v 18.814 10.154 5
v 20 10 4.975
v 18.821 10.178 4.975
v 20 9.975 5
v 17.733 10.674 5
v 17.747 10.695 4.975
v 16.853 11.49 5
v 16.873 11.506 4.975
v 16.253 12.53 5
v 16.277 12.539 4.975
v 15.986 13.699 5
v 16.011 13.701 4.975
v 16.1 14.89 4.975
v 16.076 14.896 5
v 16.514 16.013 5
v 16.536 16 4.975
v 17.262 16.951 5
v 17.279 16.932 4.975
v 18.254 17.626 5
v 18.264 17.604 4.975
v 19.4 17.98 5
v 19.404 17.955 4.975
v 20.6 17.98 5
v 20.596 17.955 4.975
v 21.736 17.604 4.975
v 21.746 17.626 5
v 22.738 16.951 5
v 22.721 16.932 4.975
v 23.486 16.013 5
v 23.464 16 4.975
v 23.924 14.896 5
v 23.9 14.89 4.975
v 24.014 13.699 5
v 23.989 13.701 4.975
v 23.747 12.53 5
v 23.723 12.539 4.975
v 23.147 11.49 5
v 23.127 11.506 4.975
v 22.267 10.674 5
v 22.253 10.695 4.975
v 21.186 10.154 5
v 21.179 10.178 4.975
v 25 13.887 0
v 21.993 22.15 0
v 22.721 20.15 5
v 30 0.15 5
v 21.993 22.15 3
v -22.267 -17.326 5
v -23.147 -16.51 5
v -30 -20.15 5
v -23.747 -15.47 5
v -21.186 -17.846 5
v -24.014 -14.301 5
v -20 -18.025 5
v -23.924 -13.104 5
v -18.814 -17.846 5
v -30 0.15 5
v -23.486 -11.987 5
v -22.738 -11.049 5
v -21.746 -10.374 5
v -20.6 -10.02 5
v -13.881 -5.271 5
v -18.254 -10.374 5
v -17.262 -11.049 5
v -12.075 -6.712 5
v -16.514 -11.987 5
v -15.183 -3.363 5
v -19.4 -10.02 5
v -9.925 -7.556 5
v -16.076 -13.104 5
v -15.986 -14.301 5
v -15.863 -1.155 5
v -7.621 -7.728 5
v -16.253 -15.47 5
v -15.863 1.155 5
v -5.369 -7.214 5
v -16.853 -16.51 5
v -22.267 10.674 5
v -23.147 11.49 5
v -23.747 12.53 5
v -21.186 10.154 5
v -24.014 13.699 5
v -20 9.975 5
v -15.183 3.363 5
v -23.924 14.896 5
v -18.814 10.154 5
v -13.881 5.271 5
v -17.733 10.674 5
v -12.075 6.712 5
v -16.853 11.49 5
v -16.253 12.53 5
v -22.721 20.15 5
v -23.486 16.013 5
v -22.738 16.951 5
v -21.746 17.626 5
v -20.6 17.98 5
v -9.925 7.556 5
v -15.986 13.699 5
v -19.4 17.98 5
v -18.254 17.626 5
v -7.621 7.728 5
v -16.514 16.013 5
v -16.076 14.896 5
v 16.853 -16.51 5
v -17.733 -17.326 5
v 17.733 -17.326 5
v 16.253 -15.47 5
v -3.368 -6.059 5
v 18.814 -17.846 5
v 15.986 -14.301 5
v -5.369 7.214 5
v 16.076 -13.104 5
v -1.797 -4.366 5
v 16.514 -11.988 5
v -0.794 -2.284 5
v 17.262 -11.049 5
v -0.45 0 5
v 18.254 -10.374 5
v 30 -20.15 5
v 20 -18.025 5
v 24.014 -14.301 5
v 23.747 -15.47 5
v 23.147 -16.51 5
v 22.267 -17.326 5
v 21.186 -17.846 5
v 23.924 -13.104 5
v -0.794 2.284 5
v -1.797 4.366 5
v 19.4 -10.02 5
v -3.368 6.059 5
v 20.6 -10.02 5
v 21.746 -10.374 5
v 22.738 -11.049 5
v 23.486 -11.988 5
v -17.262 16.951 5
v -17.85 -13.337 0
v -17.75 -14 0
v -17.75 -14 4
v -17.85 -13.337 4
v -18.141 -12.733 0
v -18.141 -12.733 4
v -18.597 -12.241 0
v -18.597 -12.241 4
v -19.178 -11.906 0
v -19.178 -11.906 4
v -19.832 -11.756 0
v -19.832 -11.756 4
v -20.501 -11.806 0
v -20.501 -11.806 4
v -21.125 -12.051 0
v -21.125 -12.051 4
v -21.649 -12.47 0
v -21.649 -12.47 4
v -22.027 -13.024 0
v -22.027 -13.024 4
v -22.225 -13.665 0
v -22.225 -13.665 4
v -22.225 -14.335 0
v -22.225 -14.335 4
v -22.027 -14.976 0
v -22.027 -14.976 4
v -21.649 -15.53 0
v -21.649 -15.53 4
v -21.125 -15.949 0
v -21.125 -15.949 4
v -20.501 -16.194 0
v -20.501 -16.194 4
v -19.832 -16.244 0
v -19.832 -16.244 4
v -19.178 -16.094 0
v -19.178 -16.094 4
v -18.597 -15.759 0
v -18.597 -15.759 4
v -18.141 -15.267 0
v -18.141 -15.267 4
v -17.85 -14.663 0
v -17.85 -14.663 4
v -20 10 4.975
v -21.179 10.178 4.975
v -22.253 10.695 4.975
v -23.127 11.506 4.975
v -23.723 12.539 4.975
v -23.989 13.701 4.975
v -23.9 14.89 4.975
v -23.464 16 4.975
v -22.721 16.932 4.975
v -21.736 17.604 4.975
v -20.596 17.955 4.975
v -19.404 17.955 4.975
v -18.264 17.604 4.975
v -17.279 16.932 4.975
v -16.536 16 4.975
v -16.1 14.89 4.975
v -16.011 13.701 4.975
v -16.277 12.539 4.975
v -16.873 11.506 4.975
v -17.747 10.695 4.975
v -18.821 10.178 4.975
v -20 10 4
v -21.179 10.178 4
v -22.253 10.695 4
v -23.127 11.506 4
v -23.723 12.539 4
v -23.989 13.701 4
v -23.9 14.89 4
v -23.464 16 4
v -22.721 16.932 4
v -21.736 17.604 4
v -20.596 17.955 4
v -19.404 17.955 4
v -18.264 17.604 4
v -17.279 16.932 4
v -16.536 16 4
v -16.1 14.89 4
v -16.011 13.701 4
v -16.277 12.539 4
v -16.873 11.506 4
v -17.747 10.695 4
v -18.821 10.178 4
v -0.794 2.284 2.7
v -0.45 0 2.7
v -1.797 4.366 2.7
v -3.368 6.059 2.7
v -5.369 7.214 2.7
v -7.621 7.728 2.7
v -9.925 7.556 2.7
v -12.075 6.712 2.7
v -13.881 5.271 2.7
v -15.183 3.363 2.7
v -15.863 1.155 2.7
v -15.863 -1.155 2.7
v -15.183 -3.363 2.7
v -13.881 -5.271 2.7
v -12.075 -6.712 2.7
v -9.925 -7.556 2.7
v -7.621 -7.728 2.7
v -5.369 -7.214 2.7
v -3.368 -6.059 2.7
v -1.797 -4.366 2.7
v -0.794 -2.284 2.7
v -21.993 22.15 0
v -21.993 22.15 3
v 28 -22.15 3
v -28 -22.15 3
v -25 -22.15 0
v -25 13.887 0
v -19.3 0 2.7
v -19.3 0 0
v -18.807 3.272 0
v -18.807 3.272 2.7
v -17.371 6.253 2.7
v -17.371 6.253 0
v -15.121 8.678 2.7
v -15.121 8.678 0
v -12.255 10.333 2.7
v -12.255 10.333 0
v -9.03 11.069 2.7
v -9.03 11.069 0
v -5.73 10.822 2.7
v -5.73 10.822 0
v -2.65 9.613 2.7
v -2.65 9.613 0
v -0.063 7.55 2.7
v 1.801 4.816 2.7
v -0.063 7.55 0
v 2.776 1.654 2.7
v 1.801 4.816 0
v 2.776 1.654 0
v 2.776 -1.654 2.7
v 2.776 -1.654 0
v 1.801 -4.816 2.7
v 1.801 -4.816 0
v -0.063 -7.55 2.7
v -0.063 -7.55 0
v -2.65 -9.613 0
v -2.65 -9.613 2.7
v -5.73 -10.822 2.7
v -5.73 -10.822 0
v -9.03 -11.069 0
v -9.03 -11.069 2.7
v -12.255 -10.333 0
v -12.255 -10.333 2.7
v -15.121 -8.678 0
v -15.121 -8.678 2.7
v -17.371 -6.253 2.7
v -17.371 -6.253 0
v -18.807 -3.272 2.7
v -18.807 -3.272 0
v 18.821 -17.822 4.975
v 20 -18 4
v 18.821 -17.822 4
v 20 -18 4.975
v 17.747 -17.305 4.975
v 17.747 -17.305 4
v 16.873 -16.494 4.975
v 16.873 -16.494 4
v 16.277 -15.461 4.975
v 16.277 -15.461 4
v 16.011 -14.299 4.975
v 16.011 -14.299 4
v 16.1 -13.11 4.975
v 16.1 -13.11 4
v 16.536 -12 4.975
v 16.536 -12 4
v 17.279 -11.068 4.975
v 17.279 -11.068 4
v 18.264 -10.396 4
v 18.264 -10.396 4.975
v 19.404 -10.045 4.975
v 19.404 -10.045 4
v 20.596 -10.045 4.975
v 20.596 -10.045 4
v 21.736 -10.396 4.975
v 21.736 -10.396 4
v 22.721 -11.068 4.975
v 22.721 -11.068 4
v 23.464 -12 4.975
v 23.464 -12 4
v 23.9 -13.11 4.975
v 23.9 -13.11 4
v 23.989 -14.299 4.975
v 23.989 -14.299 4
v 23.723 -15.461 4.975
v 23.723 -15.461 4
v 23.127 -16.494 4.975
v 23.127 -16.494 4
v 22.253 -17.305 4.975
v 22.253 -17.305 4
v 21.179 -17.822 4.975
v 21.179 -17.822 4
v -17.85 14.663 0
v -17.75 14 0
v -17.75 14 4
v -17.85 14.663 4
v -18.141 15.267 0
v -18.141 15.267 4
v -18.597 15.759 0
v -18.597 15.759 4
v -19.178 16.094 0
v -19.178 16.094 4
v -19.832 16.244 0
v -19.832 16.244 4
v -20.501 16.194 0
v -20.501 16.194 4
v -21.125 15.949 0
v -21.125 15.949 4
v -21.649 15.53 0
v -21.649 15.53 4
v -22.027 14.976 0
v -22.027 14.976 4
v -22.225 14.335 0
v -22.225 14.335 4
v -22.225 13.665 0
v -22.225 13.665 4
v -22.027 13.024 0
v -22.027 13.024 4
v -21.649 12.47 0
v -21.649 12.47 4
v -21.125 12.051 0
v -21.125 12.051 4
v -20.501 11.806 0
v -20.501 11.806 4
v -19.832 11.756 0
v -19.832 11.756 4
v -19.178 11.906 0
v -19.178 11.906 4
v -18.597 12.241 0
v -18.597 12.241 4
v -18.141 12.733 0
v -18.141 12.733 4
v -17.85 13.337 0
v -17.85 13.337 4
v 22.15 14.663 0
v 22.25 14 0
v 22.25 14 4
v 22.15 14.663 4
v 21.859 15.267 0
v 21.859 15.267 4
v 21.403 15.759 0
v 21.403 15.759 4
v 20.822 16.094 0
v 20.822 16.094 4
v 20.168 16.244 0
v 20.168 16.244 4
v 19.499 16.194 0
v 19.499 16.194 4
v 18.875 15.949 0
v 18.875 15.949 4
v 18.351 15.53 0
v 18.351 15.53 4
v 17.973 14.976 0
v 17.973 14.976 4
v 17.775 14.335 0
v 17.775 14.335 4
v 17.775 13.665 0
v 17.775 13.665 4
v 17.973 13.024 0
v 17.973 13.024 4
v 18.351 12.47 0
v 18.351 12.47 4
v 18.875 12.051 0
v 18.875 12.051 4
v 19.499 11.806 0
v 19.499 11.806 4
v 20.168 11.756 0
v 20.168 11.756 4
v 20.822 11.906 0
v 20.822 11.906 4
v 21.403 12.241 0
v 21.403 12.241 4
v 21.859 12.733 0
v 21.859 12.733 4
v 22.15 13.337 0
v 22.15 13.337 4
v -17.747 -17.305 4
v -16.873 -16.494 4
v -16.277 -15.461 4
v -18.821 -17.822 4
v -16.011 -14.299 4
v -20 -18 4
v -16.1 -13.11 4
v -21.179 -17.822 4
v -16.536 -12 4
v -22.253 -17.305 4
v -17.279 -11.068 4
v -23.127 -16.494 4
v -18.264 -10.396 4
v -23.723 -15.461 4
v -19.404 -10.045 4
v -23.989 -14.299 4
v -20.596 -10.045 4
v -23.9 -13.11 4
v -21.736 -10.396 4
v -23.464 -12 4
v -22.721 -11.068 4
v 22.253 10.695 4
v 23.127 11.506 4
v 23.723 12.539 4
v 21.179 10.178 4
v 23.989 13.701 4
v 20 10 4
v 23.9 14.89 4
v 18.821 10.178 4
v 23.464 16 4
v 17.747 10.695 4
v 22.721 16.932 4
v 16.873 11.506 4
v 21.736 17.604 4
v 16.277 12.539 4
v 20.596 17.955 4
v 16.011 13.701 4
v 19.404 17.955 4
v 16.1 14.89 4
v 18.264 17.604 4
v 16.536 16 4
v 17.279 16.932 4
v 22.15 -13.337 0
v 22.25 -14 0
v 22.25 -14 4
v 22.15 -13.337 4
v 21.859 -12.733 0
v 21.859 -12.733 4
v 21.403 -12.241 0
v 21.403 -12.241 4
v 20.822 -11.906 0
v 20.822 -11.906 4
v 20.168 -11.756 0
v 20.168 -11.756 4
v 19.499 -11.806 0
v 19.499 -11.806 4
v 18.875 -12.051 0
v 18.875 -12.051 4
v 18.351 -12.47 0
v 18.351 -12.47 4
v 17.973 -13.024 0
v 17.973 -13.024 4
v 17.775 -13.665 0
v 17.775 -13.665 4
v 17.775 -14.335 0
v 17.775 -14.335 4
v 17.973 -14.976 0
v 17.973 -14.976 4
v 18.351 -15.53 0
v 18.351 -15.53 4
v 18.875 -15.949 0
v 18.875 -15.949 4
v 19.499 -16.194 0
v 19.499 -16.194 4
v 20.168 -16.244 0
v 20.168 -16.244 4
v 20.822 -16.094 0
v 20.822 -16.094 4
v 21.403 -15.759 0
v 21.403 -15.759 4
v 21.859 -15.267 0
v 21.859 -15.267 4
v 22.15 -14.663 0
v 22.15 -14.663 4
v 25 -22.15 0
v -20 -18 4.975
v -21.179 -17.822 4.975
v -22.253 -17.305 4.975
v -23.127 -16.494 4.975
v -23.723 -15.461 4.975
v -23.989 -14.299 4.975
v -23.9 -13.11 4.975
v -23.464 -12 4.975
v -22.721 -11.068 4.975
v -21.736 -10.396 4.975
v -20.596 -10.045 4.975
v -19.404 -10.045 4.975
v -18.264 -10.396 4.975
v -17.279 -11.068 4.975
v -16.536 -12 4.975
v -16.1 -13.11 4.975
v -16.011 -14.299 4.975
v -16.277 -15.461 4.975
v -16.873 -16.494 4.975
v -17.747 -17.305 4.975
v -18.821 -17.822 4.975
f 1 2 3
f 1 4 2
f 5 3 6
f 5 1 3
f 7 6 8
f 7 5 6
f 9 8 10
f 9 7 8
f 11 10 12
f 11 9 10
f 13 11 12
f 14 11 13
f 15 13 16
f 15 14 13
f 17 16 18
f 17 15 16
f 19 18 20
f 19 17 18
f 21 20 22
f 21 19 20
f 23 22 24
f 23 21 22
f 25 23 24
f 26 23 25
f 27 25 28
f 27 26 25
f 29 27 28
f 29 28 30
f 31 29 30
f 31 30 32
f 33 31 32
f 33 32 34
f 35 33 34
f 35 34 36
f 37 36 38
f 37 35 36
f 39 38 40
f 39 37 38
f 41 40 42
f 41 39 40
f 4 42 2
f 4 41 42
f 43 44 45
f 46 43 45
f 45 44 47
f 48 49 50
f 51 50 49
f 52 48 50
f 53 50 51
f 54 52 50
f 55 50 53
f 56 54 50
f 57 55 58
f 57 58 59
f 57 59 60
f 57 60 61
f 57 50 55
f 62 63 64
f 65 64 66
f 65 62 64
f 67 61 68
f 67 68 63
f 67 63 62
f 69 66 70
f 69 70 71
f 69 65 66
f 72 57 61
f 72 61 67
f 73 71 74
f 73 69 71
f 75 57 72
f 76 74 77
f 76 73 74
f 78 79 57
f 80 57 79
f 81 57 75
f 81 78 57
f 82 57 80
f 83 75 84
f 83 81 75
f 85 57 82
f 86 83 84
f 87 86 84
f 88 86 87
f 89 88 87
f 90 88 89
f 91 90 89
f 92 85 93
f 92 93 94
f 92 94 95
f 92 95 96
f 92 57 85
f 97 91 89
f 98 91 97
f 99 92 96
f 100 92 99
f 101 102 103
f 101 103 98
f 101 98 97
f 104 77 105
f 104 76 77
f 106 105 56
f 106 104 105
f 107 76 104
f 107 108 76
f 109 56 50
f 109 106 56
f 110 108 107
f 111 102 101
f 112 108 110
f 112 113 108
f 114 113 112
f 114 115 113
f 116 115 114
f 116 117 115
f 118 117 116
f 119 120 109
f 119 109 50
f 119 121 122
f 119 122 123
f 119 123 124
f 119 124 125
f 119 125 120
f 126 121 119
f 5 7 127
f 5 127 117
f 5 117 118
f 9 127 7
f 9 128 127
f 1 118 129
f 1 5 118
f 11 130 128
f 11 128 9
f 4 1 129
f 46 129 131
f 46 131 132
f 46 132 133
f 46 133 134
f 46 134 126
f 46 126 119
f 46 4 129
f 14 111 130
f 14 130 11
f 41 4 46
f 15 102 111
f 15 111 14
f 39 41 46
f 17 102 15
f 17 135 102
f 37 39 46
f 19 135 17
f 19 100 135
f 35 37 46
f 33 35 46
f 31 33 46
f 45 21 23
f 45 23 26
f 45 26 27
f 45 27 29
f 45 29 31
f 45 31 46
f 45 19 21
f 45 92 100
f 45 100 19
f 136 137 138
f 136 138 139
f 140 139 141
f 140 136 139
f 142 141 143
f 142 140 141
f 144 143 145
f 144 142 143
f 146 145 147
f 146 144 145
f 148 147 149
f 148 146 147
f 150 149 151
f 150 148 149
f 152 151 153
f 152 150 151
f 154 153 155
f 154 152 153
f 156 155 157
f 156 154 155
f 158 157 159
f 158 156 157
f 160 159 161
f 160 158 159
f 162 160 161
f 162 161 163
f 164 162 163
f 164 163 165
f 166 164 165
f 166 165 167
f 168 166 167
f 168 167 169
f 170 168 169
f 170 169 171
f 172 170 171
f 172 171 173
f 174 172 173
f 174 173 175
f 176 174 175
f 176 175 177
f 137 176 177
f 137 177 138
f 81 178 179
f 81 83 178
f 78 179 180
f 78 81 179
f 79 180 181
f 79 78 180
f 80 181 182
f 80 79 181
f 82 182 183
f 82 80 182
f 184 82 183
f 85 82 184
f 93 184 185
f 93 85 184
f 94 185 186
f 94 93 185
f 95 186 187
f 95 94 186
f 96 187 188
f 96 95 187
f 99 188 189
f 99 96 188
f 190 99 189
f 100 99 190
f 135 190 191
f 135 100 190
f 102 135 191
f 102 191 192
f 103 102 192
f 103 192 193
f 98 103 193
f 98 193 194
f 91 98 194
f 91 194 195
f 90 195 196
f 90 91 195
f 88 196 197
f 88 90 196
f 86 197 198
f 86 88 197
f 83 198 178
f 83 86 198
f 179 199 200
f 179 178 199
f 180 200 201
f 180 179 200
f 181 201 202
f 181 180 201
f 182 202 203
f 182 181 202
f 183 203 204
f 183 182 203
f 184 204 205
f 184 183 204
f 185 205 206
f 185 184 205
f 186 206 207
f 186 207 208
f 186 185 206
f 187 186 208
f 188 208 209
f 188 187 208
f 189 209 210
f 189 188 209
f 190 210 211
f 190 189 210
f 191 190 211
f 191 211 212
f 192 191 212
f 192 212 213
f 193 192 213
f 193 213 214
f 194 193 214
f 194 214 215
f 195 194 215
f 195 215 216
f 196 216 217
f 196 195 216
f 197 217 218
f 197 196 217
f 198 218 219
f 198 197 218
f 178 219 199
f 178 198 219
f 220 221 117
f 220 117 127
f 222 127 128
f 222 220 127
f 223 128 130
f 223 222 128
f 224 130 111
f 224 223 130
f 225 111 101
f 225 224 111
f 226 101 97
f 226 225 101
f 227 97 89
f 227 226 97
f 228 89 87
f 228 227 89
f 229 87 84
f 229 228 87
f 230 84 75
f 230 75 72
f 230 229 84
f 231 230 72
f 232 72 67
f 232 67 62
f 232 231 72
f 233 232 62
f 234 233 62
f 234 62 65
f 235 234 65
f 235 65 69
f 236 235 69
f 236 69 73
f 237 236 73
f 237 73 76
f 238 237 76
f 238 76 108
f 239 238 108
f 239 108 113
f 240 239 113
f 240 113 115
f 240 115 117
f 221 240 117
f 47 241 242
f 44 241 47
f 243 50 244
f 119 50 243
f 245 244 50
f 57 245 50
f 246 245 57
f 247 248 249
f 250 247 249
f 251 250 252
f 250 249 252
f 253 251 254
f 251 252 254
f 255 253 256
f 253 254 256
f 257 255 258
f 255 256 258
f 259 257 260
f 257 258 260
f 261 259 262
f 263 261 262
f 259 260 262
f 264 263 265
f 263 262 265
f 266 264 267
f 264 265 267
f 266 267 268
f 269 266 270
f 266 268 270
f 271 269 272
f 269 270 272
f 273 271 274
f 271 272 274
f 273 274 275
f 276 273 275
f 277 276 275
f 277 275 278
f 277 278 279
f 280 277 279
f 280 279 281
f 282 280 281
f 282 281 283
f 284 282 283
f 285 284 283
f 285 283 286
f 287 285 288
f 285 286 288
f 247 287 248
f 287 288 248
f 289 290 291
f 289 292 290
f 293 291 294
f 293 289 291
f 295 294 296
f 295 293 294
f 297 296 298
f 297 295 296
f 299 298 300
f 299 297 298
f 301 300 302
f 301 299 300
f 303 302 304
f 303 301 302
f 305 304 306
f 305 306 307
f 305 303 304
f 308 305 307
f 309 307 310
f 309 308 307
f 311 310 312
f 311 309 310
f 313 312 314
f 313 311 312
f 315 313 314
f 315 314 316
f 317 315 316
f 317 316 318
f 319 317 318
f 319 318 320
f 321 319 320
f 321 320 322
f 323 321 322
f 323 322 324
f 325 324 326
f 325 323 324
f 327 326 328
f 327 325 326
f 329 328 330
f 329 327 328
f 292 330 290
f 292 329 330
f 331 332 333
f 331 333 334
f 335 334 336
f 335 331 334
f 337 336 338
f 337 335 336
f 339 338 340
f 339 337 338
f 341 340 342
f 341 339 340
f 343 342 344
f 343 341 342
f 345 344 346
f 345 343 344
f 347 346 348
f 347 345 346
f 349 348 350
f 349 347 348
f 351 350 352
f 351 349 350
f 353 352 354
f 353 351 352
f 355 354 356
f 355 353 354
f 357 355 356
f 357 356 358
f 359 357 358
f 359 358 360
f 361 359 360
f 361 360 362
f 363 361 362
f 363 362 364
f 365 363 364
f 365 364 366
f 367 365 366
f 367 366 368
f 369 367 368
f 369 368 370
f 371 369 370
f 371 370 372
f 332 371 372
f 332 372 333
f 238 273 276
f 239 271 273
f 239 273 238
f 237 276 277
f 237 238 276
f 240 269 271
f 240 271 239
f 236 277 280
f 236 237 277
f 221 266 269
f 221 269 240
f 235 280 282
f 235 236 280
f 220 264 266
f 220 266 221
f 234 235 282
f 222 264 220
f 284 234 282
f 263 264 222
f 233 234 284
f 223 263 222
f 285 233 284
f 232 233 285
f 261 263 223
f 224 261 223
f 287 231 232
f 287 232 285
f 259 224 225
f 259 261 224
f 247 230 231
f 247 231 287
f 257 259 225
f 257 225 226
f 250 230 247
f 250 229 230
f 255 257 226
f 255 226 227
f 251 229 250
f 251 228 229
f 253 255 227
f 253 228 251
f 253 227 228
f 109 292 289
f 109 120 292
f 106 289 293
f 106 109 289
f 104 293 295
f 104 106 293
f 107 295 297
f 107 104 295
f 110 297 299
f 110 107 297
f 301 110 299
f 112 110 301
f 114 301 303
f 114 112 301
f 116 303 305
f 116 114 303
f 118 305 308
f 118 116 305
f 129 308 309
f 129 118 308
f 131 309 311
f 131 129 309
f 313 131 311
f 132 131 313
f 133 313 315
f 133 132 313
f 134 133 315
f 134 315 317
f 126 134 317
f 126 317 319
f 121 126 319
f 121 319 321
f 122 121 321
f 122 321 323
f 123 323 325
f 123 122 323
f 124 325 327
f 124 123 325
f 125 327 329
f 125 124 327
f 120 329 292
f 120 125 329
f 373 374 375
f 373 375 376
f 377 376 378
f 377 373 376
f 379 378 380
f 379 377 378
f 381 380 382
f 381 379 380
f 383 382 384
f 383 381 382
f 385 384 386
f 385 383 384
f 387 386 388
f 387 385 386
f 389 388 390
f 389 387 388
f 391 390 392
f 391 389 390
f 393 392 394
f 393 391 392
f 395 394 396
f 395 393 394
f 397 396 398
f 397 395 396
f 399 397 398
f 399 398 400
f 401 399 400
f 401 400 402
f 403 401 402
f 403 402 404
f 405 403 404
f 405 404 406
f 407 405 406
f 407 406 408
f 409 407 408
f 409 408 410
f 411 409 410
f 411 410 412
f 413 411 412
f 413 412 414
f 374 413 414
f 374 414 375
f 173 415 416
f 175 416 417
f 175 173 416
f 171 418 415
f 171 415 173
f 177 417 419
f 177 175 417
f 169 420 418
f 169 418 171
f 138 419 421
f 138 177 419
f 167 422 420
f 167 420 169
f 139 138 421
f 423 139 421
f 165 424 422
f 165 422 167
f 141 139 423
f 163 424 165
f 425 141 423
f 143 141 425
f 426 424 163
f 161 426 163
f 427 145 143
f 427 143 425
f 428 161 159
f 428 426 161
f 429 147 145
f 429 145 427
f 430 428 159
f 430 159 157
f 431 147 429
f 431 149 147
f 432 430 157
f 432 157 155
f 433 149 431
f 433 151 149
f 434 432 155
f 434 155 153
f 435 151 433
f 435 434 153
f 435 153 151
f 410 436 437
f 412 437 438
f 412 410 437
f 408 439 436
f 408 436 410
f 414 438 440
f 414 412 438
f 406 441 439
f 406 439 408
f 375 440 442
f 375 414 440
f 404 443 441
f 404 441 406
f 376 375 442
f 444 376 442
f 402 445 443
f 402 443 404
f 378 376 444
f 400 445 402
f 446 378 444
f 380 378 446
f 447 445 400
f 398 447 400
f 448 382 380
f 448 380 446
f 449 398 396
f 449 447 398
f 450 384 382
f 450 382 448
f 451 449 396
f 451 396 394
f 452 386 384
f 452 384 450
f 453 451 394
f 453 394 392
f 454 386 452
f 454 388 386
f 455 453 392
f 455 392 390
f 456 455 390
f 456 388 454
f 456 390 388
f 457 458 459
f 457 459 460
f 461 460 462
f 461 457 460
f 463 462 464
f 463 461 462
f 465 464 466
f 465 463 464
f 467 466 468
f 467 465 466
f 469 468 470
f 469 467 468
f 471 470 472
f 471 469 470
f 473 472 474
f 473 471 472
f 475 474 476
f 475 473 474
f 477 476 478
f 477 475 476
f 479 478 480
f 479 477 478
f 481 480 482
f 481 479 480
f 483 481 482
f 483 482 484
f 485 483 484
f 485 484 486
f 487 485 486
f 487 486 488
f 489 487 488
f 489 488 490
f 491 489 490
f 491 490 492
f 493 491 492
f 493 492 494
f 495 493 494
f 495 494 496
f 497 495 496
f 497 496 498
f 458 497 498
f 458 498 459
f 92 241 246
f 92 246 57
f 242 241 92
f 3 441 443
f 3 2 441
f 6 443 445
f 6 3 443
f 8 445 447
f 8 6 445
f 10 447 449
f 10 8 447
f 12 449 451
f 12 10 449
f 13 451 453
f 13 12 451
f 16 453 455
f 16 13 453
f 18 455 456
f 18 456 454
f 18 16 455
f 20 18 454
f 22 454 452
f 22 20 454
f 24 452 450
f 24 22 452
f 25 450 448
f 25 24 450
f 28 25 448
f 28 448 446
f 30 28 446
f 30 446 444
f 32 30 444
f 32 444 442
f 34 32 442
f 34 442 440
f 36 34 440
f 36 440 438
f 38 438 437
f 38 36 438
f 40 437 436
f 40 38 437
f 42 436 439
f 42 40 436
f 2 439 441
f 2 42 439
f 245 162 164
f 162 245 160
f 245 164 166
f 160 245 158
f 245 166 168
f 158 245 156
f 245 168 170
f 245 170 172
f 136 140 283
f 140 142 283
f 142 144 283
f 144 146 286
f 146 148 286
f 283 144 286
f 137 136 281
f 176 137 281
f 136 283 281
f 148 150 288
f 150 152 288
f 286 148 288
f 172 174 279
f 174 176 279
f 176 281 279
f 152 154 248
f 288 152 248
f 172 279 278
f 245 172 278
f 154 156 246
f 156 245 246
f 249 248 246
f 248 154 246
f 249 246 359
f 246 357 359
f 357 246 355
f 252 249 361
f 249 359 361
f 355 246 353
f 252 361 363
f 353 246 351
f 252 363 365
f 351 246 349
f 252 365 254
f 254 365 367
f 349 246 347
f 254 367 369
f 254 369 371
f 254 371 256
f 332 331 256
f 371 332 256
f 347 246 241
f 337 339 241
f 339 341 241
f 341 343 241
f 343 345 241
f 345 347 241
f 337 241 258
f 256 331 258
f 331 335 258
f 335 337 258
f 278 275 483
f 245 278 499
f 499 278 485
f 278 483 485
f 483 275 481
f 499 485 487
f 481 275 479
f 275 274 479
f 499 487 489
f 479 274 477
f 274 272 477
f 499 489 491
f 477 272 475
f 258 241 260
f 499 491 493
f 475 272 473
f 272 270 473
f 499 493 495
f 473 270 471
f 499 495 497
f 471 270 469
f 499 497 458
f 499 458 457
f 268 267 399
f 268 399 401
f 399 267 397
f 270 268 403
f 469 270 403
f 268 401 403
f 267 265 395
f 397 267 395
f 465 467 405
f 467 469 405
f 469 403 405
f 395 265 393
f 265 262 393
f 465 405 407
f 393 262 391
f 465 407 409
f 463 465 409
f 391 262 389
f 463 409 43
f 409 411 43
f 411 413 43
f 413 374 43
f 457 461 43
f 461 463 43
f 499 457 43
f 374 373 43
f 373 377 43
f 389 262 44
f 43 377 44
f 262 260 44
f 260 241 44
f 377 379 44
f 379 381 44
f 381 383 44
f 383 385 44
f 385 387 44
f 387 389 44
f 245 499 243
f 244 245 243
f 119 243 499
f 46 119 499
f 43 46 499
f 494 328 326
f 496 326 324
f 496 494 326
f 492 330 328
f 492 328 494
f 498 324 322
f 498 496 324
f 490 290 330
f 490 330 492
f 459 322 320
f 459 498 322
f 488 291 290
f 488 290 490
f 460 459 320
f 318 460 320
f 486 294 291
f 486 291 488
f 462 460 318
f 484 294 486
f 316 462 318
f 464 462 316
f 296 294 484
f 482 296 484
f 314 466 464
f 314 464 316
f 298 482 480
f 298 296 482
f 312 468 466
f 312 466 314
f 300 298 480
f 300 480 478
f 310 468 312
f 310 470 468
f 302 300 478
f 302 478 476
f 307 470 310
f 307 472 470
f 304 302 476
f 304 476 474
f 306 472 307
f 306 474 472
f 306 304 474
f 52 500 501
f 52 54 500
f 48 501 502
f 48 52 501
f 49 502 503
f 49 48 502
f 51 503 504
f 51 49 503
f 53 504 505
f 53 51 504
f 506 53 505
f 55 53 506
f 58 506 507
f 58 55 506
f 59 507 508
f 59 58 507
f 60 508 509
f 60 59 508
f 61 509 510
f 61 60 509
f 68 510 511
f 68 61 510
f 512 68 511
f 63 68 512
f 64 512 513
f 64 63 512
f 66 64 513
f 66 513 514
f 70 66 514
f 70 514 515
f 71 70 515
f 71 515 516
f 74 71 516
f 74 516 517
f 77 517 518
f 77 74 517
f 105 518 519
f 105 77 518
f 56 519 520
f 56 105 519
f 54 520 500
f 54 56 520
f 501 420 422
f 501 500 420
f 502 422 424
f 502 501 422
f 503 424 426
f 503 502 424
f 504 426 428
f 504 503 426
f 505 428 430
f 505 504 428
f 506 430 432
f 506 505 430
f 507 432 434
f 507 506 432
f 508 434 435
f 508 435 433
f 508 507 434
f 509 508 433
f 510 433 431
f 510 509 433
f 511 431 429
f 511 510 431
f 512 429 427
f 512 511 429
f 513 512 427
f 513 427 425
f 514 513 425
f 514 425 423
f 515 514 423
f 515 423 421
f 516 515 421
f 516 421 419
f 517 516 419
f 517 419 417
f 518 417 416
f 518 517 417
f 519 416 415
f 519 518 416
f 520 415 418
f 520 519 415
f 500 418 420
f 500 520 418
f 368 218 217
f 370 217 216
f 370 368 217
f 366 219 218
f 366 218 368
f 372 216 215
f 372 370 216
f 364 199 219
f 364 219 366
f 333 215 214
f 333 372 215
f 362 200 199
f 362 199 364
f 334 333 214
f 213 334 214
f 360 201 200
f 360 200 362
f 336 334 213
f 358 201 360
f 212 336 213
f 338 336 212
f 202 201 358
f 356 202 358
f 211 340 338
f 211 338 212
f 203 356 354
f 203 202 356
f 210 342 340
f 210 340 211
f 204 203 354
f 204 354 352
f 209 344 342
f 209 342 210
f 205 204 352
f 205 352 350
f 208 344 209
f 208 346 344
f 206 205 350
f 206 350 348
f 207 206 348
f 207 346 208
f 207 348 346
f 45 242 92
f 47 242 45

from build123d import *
from OCP.BRepFilletAPI import BRepFilletAPI_MakeChamfer

# Parameters (mm, degrees)
SKETCH2_W                                    = 60
SKETCH2_H                                    = 44.3
SKETCH2_R                                    = 2.25
SKETCH2_R_2                                  = 7.75
BOSS_EXTRUDE1_DEPTH                          = 5
CBORE_FOR_M4_HEX_SOCKET_HEAD_CAP_SCR_2_COUNT = 2
CBORE_FOR_M4_HEX_SOCKET_HEAD_CAP_SCR_2_PITCH = 40
CBORE_FOR_M4_HEX_SOCKET_HEAD_CAP_SCR_3_COUNT = 2
CBORE_FOR_M4_HEX_SOCKET_HEAD_CAP_SCR_3_PITCH = 48.826222463
CBORE_FOR_M4_HEX_SOCKET_HEAD_CAP_SCR_4_COUNT = 2
CBORE_FOR_M4_HEX_SOCKET_HEAD_CAP_SCR_4_PITCH = 28
SKETCH7_R                                    = 11.1
CUT_EXTRUDE1_DEPTH                           = 2.7
CHAMFER2_SIZE                                = 22
CHAMFER2_SIZE2                               = 8.007345154
CHAMFER3_SIZE                                = 2
CHAMFER1_SIZE                                = 5


with BuildPart() as part:
    # Sketch2 → Boss-Extrude1 (new body)
    with BuildSketch(Plane.XY):
        Rectangle(SKETCH2_W, SKETCH2_H)
        with Locations((-20, 14)):
            Circle(SKETCH2_R, mode=Mode.SUBTRACT)
        with Locations((-20, -14)):
            Circle(SKETCH2_R, mode=Mode.SUBTRACT)
        with Locations((20, 14)):
            Circle(SKETCH2_R, mode=Mode.SUBTRACT)
        with Locations((20, -14)):
            Circle(SKETCH2_R, mode=Mode.SUBTRACT)
        with Locations((-8.2, 0)):
            Circle(SKETCH2_R_2, mode=Mode.SUBTRACT)
    extrude(amount=BOSS_EXTRUDE1_DEPTH)

    # Sketch4 → CBORE for M4 Hex Socket Head Cap Screw1 (revolve, cut)
    with BuildSketch(Plane(origin=(-20, 14, 5), x_dir=(0, -1, 0), z_dir=(1, 0, 0))):
        Polygon((0, 0), (0, 5), (2.25, 5), (2.25, 1), (4, 1), (4, 0.025), (4.025, 0), align=None)
    cbore_for_m4_hex_socket_head_cap_screw1 = revolve(axis=Axis((-20, 14, 11.35), (0, 0, -1)), mode=Mode.SUBTRACT)

    # CBORE for M4 Hex Socket Head Cap Scr 2: CBORE for M4 Hex Socket Head Cap Screw1 ×2
    with Locations(*[(i * CBORE_FOR_M4_HEX_SOCKET_HEAD_CAP_SCR_2_PITCH, 0, 0) for i in range(1, CBORE_FOR_M4_HEX_SOCKET_HEAD_CAP_SCR_2_COUNT)]):
        add(cbore_for_m4_hex_socket_head_cap_screw1, mode=Mode.SUBTRACT)

    # CBORE for M4 Hex Socket Head Cap Scr 3: CBORE for M4 Hex Socket Head Cap Screw1 ×2
    with Locations(*[Vector(0.8192319205190405, -0.5734623443633283, 0) * (i * CBORE_FOR_M4_HEX_SOCKET_HEAD_CAP_SCR_3_PITCH) for i in range(1, CBORE_FOR_M4_HEX_SOCKET_HEAD_CAP_SCR_3_COUNT)]):
        add(cbore_for_m4_hex_socket_head_cap_screw1, mode=Mode.SUBTRACT)

    # CBORE for M4 Hex Socket Head Cap Scr 4: CBORE for M4 Hex Socket Head Cap Screw1 ×2
    with Locations(*[(0, -i * CBORE_FOR_M4_HEX_SOCKET_HEAD_CAP_SCR_4_PITCH, 0) for i in range(1, CBORE_FOR_M4_HEX_SOCKET_HEAD_CAP_SCR_4_COUNT)]):
        add(cbore_for_m4_hex_socket_head_cap_screw1, mode=Mode.SUBTRACT)

    # Sketch7 → Cut-Extrude1 (cut)
    with BuildSketch(Plane(origin=(0, 0, 0), x_dir=(-1, 0, 0), z_dir=(0, 0, -1))):
        with Locations((8.2, 0)):
            Circle(SKETCH7_R)
    extrude(amount=-CUT_EXTRUDE1_DEPTH, mode=Mode.SUBTRACT)

    # Chamfer2: one chamfer whose edges measure the first distance from different faces: ONE call of the kernel's chamfer builder (chamfer() names one face for all edges)
    chamfer2_edges_1 = [part.edges().sort_by_distance(p)[0] for p in [
        (-30, 22.15, 2.5),
    ]]
    chamfer2_side_1 = [part.faces().sort_by_distance(p)[0] for p in [
        (-30, 0, 2.5),
    ]]
    chamfer2_edges_2 = [part.edges().sort_by_distance(p)[0] for p in [
        (30, 22.15, 2.5),
    ]]
    chamfer2_side_2 = [part.faces().sort_by_distance(p)[0] for p in [
        (30, 0, 2.5),
    ]]
    chamfer2 = BRepFilletAPI_MakeChamfer(part.part.solid().wrapped)
    for e in chamfer2_edges_1:
        chamfer2.Add(CHAMFER2_SIZE, CHAMFER2_SIZE2, e.wrapped, chamfer2_side_1[0].wrapped)  # the first distance lies on this face
    for e in chamfer2_edges_2:
        chamfer2.Add(CHAMFER2_SIZE, CHAMFER2_SIZE2, e.wrapped, chamfer2_side_2[0].wrapped)  # the first distance lies on this face
    add(Compound.cast(chamfer2.Shape()), mode=Mode.REPLACE)

    # Chamfer3
    chamfer3_edges = [part.edges().sort_by_distance(p)[0] for p in [
        (0, -22.15, 5),
        (0, 22.15, 5),
    ]]
    chamfer(chamfer3_edges, length=CHAMFER3_SIZE)

    # Chamfer1
    chamfer1_edges = [part.edges().sort_by_distance(p)[0] for p in [
        (-30, -11, 0),
        (30, -11, 0),
    ]]
    chamfer(chamfer1_edges, length=CHAMFER1_SIZE - 0.0001)  # a hair under: the kernel refuses the full size


solid = part.part
